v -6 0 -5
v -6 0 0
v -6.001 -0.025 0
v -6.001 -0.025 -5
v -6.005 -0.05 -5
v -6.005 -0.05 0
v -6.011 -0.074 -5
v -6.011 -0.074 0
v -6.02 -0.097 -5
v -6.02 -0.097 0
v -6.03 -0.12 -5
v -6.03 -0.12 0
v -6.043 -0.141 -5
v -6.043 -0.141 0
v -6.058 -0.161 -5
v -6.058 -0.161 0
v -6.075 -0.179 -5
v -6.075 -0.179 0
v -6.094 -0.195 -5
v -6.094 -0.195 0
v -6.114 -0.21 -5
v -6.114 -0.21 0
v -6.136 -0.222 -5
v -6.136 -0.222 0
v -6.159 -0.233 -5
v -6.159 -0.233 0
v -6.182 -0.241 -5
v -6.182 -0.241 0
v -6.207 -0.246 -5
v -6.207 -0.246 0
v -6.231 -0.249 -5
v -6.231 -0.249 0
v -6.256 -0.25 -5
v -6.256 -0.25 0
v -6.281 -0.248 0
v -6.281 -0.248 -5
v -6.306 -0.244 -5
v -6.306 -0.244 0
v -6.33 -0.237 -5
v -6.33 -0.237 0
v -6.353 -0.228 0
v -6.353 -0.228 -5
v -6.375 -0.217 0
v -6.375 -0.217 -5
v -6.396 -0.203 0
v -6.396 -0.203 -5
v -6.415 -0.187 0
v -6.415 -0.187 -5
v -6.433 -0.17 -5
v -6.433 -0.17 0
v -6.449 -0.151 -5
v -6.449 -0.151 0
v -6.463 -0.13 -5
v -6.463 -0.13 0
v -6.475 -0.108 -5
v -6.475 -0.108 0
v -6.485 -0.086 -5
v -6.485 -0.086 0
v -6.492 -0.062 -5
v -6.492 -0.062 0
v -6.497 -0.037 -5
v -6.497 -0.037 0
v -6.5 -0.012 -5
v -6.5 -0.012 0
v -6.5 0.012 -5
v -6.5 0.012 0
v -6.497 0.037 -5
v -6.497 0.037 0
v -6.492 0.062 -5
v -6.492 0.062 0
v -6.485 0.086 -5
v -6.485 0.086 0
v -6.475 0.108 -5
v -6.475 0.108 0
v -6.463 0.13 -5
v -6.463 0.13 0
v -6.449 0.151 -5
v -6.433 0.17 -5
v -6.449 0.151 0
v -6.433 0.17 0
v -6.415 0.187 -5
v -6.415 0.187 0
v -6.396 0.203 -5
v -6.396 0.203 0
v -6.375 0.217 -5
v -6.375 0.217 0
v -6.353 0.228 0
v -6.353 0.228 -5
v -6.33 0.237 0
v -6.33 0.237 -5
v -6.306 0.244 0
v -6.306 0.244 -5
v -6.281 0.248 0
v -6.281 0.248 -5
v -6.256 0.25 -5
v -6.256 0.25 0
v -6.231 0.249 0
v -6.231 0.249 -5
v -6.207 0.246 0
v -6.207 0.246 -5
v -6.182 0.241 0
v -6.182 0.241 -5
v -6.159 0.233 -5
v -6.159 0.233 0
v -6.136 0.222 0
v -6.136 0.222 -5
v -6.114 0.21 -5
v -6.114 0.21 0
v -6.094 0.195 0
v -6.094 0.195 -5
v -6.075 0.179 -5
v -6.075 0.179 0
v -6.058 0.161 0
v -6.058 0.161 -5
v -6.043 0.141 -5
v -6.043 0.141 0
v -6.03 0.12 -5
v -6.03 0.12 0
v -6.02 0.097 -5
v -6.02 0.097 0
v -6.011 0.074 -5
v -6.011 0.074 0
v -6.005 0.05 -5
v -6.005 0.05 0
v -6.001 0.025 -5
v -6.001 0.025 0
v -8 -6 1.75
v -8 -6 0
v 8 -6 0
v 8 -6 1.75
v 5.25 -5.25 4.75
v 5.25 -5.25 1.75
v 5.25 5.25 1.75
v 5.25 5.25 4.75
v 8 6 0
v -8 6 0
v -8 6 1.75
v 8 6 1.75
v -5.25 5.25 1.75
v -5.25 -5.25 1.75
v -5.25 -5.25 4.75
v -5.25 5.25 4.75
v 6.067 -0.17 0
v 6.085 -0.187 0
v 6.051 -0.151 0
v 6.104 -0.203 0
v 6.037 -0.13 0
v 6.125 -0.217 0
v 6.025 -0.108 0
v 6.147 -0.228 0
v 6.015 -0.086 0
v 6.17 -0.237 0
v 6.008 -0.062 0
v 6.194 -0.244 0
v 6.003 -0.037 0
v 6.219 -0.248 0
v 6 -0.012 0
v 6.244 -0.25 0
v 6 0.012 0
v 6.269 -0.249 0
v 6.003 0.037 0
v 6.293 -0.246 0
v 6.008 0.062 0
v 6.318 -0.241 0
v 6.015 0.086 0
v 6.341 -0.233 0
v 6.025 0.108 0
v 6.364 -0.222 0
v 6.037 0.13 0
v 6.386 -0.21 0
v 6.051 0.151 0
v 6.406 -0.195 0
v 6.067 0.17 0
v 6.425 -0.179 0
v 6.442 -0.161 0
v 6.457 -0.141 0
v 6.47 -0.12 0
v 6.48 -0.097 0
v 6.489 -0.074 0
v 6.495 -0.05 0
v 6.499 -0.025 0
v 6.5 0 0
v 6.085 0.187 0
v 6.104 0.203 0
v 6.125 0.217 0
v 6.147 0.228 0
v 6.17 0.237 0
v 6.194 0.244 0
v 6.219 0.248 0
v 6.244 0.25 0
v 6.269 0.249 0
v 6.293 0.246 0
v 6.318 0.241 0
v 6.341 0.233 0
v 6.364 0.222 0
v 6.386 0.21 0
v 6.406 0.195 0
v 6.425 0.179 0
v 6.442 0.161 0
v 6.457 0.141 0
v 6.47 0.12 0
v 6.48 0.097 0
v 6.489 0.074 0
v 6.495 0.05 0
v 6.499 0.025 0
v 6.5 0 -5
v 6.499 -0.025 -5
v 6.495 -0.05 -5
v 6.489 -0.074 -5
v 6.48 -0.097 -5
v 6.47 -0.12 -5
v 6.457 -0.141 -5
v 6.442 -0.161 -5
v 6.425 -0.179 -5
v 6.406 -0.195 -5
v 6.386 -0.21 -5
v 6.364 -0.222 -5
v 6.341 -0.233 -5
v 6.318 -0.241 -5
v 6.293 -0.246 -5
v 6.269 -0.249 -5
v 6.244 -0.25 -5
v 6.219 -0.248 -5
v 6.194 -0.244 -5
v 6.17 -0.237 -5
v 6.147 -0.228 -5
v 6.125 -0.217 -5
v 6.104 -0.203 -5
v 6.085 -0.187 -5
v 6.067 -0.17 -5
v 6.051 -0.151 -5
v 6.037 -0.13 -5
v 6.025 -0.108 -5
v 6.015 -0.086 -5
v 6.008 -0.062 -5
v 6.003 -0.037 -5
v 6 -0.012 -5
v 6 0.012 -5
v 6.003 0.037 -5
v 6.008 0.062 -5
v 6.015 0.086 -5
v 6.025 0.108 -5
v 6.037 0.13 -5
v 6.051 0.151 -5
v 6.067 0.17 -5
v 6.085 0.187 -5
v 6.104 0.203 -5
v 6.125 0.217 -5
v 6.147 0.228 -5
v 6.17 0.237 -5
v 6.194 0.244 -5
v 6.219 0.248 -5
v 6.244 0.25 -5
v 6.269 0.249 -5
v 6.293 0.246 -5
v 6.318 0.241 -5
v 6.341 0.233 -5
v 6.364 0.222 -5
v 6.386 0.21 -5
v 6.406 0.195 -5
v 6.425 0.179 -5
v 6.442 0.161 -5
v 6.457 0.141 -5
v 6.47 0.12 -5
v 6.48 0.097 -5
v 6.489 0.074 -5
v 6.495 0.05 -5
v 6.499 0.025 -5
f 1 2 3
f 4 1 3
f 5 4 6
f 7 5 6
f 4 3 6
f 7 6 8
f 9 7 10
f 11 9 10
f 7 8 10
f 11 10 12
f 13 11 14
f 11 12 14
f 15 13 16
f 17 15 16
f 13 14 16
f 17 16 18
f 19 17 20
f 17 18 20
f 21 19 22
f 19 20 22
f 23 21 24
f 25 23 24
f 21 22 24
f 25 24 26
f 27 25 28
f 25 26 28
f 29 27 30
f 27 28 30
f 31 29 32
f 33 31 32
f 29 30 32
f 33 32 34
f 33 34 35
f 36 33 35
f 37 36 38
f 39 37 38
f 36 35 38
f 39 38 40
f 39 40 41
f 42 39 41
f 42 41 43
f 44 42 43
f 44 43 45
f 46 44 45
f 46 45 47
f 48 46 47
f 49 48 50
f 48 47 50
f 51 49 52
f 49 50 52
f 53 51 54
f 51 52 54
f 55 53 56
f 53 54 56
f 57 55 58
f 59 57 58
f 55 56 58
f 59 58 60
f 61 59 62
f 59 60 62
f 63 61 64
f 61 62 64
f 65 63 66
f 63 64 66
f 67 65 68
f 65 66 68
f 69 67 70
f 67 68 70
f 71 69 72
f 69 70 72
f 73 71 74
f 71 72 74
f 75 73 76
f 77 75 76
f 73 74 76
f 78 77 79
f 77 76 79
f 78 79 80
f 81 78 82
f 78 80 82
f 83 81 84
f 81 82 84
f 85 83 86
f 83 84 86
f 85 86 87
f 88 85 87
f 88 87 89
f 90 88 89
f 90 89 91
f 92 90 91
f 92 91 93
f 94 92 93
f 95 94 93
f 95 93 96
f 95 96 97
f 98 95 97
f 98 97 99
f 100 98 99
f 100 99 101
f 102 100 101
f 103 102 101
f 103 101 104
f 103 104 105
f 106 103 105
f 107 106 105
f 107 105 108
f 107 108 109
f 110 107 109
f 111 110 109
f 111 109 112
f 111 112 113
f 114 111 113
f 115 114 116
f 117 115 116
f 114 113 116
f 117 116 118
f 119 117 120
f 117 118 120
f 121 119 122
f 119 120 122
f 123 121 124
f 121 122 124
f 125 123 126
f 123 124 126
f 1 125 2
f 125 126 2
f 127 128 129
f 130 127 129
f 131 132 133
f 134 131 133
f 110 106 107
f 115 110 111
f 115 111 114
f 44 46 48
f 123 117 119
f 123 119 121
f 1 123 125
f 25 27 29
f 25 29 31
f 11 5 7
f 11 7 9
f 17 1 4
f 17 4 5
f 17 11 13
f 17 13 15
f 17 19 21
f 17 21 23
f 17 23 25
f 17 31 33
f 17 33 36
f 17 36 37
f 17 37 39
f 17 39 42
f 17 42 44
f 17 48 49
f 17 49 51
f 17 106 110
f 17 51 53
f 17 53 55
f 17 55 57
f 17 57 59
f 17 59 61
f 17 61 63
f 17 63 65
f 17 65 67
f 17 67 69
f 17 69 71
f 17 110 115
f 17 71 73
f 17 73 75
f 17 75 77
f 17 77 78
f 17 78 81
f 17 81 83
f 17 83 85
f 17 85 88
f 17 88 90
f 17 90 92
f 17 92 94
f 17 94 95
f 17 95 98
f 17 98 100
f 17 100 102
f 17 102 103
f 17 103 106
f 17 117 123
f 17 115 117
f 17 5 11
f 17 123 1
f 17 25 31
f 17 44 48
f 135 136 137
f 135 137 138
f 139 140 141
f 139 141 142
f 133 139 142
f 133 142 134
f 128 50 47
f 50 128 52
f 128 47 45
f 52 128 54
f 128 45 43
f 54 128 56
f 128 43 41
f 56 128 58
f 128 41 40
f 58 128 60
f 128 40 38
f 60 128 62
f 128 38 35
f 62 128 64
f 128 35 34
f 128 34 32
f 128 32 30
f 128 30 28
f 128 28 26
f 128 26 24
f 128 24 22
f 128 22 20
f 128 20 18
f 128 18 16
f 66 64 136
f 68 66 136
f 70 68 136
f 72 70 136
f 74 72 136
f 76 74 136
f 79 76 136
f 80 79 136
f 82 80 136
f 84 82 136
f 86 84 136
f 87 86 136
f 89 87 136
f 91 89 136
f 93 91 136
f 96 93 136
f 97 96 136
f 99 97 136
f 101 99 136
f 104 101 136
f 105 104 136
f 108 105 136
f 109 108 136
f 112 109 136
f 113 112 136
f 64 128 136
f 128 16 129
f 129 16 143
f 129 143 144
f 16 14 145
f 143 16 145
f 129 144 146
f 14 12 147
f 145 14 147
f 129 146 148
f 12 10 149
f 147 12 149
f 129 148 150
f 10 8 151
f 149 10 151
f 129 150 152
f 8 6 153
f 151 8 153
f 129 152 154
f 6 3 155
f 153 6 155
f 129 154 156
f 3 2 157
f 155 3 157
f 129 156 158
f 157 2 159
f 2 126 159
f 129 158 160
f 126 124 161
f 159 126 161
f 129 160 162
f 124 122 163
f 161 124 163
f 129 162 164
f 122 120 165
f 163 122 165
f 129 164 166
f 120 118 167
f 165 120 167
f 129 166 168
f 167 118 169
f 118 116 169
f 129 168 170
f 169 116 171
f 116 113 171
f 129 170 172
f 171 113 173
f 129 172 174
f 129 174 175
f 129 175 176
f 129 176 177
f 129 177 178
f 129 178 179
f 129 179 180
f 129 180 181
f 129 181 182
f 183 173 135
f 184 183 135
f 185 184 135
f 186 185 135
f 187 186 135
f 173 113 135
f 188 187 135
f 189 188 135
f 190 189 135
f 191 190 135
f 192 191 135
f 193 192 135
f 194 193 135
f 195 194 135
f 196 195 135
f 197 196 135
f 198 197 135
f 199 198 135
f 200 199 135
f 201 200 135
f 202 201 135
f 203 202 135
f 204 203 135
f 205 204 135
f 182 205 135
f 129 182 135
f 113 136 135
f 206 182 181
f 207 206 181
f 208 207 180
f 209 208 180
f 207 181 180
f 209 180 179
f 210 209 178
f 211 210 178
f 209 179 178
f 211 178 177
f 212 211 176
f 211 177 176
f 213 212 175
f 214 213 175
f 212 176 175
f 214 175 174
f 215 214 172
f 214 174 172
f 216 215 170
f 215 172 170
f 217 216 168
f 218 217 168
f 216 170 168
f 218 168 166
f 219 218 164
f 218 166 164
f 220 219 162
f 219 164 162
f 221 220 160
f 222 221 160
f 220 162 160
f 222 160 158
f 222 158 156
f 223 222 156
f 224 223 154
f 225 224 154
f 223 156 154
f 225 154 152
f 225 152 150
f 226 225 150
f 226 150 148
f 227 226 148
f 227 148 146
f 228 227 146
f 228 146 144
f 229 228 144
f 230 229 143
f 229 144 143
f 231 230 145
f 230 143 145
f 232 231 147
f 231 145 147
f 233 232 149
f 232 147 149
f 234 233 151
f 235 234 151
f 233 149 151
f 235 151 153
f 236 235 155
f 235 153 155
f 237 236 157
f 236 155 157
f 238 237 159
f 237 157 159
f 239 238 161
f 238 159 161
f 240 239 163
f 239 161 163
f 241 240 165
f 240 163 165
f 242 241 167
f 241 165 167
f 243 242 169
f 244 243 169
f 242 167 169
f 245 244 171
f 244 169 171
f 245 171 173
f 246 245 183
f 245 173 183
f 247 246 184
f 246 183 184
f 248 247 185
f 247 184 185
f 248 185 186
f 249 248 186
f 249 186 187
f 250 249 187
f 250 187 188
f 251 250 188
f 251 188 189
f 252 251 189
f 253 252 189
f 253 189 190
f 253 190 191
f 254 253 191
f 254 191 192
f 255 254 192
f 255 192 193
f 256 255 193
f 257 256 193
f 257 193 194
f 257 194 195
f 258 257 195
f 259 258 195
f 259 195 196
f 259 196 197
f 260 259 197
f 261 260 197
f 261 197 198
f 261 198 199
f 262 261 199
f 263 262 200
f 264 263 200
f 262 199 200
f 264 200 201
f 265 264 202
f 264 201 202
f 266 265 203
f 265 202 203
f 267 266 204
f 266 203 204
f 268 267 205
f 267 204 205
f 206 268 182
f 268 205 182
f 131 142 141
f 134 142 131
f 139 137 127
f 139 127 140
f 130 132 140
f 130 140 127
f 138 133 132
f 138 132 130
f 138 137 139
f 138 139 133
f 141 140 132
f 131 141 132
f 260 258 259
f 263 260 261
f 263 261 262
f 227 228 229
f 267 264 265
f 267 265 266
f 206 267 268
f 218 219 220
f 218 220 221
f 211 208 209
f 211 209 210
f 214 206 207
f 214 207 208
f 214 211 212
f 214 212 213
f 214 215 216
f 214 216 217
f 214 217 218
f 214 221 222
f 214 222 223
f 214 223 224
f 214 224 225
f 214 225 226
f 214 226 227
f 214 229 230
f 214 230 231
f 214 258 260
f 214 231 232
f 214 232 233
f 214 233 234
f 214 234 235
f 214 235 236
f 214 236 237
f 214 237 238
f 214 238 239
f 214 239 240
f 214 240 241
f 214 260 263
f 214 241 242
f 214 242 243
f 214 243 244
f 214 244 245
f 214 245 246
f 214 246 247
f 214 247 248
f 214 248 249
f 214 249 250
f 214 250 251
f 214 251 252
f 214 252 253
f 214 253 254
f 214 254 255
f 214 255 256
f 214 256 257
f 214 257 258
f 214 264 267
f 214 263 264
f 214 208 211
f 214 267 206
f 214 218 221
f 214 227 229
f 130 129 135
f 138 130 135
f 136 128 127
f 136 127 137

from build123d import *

# Parameters (mm, degrees)
F0_W     = 16
F0_H     = 12
F1_DEPTH = 1.75
F2_W     = 10.5
F2_H     = 10.5
F3_DEPTH = 3
F4_R     = 0.25
F5_DEPTH = 5


with BuildPart() as f1:
    # F0 (on Top) → F1 (new body)
    with BuildSketch(Plane.XY):
        Rectangle(F0_W, F0_H)
    extrude(amount=F1_DEPTH)

    # F2 (on face) → F3 (join)
    with BuildSketch(Plane.XY.offset(1.75)):
        Rectangle(F2_W, F2_H)
    extrude(amount=F3_DEPTH)

    # F4 (on face) → F5 (join)
    with BuildSketch(Plane(origin=(0, 0, 0), x_dir=(1, 0, 0), z_dir=(0, 0, -1))):
        with Locations((-6.25, 0)):
            Circle(F4_R)
        with Locations((6.25, 0)):
            Circle(F4_R)
    extrude(amount=F5_DEPTH)


solid = f1.part
